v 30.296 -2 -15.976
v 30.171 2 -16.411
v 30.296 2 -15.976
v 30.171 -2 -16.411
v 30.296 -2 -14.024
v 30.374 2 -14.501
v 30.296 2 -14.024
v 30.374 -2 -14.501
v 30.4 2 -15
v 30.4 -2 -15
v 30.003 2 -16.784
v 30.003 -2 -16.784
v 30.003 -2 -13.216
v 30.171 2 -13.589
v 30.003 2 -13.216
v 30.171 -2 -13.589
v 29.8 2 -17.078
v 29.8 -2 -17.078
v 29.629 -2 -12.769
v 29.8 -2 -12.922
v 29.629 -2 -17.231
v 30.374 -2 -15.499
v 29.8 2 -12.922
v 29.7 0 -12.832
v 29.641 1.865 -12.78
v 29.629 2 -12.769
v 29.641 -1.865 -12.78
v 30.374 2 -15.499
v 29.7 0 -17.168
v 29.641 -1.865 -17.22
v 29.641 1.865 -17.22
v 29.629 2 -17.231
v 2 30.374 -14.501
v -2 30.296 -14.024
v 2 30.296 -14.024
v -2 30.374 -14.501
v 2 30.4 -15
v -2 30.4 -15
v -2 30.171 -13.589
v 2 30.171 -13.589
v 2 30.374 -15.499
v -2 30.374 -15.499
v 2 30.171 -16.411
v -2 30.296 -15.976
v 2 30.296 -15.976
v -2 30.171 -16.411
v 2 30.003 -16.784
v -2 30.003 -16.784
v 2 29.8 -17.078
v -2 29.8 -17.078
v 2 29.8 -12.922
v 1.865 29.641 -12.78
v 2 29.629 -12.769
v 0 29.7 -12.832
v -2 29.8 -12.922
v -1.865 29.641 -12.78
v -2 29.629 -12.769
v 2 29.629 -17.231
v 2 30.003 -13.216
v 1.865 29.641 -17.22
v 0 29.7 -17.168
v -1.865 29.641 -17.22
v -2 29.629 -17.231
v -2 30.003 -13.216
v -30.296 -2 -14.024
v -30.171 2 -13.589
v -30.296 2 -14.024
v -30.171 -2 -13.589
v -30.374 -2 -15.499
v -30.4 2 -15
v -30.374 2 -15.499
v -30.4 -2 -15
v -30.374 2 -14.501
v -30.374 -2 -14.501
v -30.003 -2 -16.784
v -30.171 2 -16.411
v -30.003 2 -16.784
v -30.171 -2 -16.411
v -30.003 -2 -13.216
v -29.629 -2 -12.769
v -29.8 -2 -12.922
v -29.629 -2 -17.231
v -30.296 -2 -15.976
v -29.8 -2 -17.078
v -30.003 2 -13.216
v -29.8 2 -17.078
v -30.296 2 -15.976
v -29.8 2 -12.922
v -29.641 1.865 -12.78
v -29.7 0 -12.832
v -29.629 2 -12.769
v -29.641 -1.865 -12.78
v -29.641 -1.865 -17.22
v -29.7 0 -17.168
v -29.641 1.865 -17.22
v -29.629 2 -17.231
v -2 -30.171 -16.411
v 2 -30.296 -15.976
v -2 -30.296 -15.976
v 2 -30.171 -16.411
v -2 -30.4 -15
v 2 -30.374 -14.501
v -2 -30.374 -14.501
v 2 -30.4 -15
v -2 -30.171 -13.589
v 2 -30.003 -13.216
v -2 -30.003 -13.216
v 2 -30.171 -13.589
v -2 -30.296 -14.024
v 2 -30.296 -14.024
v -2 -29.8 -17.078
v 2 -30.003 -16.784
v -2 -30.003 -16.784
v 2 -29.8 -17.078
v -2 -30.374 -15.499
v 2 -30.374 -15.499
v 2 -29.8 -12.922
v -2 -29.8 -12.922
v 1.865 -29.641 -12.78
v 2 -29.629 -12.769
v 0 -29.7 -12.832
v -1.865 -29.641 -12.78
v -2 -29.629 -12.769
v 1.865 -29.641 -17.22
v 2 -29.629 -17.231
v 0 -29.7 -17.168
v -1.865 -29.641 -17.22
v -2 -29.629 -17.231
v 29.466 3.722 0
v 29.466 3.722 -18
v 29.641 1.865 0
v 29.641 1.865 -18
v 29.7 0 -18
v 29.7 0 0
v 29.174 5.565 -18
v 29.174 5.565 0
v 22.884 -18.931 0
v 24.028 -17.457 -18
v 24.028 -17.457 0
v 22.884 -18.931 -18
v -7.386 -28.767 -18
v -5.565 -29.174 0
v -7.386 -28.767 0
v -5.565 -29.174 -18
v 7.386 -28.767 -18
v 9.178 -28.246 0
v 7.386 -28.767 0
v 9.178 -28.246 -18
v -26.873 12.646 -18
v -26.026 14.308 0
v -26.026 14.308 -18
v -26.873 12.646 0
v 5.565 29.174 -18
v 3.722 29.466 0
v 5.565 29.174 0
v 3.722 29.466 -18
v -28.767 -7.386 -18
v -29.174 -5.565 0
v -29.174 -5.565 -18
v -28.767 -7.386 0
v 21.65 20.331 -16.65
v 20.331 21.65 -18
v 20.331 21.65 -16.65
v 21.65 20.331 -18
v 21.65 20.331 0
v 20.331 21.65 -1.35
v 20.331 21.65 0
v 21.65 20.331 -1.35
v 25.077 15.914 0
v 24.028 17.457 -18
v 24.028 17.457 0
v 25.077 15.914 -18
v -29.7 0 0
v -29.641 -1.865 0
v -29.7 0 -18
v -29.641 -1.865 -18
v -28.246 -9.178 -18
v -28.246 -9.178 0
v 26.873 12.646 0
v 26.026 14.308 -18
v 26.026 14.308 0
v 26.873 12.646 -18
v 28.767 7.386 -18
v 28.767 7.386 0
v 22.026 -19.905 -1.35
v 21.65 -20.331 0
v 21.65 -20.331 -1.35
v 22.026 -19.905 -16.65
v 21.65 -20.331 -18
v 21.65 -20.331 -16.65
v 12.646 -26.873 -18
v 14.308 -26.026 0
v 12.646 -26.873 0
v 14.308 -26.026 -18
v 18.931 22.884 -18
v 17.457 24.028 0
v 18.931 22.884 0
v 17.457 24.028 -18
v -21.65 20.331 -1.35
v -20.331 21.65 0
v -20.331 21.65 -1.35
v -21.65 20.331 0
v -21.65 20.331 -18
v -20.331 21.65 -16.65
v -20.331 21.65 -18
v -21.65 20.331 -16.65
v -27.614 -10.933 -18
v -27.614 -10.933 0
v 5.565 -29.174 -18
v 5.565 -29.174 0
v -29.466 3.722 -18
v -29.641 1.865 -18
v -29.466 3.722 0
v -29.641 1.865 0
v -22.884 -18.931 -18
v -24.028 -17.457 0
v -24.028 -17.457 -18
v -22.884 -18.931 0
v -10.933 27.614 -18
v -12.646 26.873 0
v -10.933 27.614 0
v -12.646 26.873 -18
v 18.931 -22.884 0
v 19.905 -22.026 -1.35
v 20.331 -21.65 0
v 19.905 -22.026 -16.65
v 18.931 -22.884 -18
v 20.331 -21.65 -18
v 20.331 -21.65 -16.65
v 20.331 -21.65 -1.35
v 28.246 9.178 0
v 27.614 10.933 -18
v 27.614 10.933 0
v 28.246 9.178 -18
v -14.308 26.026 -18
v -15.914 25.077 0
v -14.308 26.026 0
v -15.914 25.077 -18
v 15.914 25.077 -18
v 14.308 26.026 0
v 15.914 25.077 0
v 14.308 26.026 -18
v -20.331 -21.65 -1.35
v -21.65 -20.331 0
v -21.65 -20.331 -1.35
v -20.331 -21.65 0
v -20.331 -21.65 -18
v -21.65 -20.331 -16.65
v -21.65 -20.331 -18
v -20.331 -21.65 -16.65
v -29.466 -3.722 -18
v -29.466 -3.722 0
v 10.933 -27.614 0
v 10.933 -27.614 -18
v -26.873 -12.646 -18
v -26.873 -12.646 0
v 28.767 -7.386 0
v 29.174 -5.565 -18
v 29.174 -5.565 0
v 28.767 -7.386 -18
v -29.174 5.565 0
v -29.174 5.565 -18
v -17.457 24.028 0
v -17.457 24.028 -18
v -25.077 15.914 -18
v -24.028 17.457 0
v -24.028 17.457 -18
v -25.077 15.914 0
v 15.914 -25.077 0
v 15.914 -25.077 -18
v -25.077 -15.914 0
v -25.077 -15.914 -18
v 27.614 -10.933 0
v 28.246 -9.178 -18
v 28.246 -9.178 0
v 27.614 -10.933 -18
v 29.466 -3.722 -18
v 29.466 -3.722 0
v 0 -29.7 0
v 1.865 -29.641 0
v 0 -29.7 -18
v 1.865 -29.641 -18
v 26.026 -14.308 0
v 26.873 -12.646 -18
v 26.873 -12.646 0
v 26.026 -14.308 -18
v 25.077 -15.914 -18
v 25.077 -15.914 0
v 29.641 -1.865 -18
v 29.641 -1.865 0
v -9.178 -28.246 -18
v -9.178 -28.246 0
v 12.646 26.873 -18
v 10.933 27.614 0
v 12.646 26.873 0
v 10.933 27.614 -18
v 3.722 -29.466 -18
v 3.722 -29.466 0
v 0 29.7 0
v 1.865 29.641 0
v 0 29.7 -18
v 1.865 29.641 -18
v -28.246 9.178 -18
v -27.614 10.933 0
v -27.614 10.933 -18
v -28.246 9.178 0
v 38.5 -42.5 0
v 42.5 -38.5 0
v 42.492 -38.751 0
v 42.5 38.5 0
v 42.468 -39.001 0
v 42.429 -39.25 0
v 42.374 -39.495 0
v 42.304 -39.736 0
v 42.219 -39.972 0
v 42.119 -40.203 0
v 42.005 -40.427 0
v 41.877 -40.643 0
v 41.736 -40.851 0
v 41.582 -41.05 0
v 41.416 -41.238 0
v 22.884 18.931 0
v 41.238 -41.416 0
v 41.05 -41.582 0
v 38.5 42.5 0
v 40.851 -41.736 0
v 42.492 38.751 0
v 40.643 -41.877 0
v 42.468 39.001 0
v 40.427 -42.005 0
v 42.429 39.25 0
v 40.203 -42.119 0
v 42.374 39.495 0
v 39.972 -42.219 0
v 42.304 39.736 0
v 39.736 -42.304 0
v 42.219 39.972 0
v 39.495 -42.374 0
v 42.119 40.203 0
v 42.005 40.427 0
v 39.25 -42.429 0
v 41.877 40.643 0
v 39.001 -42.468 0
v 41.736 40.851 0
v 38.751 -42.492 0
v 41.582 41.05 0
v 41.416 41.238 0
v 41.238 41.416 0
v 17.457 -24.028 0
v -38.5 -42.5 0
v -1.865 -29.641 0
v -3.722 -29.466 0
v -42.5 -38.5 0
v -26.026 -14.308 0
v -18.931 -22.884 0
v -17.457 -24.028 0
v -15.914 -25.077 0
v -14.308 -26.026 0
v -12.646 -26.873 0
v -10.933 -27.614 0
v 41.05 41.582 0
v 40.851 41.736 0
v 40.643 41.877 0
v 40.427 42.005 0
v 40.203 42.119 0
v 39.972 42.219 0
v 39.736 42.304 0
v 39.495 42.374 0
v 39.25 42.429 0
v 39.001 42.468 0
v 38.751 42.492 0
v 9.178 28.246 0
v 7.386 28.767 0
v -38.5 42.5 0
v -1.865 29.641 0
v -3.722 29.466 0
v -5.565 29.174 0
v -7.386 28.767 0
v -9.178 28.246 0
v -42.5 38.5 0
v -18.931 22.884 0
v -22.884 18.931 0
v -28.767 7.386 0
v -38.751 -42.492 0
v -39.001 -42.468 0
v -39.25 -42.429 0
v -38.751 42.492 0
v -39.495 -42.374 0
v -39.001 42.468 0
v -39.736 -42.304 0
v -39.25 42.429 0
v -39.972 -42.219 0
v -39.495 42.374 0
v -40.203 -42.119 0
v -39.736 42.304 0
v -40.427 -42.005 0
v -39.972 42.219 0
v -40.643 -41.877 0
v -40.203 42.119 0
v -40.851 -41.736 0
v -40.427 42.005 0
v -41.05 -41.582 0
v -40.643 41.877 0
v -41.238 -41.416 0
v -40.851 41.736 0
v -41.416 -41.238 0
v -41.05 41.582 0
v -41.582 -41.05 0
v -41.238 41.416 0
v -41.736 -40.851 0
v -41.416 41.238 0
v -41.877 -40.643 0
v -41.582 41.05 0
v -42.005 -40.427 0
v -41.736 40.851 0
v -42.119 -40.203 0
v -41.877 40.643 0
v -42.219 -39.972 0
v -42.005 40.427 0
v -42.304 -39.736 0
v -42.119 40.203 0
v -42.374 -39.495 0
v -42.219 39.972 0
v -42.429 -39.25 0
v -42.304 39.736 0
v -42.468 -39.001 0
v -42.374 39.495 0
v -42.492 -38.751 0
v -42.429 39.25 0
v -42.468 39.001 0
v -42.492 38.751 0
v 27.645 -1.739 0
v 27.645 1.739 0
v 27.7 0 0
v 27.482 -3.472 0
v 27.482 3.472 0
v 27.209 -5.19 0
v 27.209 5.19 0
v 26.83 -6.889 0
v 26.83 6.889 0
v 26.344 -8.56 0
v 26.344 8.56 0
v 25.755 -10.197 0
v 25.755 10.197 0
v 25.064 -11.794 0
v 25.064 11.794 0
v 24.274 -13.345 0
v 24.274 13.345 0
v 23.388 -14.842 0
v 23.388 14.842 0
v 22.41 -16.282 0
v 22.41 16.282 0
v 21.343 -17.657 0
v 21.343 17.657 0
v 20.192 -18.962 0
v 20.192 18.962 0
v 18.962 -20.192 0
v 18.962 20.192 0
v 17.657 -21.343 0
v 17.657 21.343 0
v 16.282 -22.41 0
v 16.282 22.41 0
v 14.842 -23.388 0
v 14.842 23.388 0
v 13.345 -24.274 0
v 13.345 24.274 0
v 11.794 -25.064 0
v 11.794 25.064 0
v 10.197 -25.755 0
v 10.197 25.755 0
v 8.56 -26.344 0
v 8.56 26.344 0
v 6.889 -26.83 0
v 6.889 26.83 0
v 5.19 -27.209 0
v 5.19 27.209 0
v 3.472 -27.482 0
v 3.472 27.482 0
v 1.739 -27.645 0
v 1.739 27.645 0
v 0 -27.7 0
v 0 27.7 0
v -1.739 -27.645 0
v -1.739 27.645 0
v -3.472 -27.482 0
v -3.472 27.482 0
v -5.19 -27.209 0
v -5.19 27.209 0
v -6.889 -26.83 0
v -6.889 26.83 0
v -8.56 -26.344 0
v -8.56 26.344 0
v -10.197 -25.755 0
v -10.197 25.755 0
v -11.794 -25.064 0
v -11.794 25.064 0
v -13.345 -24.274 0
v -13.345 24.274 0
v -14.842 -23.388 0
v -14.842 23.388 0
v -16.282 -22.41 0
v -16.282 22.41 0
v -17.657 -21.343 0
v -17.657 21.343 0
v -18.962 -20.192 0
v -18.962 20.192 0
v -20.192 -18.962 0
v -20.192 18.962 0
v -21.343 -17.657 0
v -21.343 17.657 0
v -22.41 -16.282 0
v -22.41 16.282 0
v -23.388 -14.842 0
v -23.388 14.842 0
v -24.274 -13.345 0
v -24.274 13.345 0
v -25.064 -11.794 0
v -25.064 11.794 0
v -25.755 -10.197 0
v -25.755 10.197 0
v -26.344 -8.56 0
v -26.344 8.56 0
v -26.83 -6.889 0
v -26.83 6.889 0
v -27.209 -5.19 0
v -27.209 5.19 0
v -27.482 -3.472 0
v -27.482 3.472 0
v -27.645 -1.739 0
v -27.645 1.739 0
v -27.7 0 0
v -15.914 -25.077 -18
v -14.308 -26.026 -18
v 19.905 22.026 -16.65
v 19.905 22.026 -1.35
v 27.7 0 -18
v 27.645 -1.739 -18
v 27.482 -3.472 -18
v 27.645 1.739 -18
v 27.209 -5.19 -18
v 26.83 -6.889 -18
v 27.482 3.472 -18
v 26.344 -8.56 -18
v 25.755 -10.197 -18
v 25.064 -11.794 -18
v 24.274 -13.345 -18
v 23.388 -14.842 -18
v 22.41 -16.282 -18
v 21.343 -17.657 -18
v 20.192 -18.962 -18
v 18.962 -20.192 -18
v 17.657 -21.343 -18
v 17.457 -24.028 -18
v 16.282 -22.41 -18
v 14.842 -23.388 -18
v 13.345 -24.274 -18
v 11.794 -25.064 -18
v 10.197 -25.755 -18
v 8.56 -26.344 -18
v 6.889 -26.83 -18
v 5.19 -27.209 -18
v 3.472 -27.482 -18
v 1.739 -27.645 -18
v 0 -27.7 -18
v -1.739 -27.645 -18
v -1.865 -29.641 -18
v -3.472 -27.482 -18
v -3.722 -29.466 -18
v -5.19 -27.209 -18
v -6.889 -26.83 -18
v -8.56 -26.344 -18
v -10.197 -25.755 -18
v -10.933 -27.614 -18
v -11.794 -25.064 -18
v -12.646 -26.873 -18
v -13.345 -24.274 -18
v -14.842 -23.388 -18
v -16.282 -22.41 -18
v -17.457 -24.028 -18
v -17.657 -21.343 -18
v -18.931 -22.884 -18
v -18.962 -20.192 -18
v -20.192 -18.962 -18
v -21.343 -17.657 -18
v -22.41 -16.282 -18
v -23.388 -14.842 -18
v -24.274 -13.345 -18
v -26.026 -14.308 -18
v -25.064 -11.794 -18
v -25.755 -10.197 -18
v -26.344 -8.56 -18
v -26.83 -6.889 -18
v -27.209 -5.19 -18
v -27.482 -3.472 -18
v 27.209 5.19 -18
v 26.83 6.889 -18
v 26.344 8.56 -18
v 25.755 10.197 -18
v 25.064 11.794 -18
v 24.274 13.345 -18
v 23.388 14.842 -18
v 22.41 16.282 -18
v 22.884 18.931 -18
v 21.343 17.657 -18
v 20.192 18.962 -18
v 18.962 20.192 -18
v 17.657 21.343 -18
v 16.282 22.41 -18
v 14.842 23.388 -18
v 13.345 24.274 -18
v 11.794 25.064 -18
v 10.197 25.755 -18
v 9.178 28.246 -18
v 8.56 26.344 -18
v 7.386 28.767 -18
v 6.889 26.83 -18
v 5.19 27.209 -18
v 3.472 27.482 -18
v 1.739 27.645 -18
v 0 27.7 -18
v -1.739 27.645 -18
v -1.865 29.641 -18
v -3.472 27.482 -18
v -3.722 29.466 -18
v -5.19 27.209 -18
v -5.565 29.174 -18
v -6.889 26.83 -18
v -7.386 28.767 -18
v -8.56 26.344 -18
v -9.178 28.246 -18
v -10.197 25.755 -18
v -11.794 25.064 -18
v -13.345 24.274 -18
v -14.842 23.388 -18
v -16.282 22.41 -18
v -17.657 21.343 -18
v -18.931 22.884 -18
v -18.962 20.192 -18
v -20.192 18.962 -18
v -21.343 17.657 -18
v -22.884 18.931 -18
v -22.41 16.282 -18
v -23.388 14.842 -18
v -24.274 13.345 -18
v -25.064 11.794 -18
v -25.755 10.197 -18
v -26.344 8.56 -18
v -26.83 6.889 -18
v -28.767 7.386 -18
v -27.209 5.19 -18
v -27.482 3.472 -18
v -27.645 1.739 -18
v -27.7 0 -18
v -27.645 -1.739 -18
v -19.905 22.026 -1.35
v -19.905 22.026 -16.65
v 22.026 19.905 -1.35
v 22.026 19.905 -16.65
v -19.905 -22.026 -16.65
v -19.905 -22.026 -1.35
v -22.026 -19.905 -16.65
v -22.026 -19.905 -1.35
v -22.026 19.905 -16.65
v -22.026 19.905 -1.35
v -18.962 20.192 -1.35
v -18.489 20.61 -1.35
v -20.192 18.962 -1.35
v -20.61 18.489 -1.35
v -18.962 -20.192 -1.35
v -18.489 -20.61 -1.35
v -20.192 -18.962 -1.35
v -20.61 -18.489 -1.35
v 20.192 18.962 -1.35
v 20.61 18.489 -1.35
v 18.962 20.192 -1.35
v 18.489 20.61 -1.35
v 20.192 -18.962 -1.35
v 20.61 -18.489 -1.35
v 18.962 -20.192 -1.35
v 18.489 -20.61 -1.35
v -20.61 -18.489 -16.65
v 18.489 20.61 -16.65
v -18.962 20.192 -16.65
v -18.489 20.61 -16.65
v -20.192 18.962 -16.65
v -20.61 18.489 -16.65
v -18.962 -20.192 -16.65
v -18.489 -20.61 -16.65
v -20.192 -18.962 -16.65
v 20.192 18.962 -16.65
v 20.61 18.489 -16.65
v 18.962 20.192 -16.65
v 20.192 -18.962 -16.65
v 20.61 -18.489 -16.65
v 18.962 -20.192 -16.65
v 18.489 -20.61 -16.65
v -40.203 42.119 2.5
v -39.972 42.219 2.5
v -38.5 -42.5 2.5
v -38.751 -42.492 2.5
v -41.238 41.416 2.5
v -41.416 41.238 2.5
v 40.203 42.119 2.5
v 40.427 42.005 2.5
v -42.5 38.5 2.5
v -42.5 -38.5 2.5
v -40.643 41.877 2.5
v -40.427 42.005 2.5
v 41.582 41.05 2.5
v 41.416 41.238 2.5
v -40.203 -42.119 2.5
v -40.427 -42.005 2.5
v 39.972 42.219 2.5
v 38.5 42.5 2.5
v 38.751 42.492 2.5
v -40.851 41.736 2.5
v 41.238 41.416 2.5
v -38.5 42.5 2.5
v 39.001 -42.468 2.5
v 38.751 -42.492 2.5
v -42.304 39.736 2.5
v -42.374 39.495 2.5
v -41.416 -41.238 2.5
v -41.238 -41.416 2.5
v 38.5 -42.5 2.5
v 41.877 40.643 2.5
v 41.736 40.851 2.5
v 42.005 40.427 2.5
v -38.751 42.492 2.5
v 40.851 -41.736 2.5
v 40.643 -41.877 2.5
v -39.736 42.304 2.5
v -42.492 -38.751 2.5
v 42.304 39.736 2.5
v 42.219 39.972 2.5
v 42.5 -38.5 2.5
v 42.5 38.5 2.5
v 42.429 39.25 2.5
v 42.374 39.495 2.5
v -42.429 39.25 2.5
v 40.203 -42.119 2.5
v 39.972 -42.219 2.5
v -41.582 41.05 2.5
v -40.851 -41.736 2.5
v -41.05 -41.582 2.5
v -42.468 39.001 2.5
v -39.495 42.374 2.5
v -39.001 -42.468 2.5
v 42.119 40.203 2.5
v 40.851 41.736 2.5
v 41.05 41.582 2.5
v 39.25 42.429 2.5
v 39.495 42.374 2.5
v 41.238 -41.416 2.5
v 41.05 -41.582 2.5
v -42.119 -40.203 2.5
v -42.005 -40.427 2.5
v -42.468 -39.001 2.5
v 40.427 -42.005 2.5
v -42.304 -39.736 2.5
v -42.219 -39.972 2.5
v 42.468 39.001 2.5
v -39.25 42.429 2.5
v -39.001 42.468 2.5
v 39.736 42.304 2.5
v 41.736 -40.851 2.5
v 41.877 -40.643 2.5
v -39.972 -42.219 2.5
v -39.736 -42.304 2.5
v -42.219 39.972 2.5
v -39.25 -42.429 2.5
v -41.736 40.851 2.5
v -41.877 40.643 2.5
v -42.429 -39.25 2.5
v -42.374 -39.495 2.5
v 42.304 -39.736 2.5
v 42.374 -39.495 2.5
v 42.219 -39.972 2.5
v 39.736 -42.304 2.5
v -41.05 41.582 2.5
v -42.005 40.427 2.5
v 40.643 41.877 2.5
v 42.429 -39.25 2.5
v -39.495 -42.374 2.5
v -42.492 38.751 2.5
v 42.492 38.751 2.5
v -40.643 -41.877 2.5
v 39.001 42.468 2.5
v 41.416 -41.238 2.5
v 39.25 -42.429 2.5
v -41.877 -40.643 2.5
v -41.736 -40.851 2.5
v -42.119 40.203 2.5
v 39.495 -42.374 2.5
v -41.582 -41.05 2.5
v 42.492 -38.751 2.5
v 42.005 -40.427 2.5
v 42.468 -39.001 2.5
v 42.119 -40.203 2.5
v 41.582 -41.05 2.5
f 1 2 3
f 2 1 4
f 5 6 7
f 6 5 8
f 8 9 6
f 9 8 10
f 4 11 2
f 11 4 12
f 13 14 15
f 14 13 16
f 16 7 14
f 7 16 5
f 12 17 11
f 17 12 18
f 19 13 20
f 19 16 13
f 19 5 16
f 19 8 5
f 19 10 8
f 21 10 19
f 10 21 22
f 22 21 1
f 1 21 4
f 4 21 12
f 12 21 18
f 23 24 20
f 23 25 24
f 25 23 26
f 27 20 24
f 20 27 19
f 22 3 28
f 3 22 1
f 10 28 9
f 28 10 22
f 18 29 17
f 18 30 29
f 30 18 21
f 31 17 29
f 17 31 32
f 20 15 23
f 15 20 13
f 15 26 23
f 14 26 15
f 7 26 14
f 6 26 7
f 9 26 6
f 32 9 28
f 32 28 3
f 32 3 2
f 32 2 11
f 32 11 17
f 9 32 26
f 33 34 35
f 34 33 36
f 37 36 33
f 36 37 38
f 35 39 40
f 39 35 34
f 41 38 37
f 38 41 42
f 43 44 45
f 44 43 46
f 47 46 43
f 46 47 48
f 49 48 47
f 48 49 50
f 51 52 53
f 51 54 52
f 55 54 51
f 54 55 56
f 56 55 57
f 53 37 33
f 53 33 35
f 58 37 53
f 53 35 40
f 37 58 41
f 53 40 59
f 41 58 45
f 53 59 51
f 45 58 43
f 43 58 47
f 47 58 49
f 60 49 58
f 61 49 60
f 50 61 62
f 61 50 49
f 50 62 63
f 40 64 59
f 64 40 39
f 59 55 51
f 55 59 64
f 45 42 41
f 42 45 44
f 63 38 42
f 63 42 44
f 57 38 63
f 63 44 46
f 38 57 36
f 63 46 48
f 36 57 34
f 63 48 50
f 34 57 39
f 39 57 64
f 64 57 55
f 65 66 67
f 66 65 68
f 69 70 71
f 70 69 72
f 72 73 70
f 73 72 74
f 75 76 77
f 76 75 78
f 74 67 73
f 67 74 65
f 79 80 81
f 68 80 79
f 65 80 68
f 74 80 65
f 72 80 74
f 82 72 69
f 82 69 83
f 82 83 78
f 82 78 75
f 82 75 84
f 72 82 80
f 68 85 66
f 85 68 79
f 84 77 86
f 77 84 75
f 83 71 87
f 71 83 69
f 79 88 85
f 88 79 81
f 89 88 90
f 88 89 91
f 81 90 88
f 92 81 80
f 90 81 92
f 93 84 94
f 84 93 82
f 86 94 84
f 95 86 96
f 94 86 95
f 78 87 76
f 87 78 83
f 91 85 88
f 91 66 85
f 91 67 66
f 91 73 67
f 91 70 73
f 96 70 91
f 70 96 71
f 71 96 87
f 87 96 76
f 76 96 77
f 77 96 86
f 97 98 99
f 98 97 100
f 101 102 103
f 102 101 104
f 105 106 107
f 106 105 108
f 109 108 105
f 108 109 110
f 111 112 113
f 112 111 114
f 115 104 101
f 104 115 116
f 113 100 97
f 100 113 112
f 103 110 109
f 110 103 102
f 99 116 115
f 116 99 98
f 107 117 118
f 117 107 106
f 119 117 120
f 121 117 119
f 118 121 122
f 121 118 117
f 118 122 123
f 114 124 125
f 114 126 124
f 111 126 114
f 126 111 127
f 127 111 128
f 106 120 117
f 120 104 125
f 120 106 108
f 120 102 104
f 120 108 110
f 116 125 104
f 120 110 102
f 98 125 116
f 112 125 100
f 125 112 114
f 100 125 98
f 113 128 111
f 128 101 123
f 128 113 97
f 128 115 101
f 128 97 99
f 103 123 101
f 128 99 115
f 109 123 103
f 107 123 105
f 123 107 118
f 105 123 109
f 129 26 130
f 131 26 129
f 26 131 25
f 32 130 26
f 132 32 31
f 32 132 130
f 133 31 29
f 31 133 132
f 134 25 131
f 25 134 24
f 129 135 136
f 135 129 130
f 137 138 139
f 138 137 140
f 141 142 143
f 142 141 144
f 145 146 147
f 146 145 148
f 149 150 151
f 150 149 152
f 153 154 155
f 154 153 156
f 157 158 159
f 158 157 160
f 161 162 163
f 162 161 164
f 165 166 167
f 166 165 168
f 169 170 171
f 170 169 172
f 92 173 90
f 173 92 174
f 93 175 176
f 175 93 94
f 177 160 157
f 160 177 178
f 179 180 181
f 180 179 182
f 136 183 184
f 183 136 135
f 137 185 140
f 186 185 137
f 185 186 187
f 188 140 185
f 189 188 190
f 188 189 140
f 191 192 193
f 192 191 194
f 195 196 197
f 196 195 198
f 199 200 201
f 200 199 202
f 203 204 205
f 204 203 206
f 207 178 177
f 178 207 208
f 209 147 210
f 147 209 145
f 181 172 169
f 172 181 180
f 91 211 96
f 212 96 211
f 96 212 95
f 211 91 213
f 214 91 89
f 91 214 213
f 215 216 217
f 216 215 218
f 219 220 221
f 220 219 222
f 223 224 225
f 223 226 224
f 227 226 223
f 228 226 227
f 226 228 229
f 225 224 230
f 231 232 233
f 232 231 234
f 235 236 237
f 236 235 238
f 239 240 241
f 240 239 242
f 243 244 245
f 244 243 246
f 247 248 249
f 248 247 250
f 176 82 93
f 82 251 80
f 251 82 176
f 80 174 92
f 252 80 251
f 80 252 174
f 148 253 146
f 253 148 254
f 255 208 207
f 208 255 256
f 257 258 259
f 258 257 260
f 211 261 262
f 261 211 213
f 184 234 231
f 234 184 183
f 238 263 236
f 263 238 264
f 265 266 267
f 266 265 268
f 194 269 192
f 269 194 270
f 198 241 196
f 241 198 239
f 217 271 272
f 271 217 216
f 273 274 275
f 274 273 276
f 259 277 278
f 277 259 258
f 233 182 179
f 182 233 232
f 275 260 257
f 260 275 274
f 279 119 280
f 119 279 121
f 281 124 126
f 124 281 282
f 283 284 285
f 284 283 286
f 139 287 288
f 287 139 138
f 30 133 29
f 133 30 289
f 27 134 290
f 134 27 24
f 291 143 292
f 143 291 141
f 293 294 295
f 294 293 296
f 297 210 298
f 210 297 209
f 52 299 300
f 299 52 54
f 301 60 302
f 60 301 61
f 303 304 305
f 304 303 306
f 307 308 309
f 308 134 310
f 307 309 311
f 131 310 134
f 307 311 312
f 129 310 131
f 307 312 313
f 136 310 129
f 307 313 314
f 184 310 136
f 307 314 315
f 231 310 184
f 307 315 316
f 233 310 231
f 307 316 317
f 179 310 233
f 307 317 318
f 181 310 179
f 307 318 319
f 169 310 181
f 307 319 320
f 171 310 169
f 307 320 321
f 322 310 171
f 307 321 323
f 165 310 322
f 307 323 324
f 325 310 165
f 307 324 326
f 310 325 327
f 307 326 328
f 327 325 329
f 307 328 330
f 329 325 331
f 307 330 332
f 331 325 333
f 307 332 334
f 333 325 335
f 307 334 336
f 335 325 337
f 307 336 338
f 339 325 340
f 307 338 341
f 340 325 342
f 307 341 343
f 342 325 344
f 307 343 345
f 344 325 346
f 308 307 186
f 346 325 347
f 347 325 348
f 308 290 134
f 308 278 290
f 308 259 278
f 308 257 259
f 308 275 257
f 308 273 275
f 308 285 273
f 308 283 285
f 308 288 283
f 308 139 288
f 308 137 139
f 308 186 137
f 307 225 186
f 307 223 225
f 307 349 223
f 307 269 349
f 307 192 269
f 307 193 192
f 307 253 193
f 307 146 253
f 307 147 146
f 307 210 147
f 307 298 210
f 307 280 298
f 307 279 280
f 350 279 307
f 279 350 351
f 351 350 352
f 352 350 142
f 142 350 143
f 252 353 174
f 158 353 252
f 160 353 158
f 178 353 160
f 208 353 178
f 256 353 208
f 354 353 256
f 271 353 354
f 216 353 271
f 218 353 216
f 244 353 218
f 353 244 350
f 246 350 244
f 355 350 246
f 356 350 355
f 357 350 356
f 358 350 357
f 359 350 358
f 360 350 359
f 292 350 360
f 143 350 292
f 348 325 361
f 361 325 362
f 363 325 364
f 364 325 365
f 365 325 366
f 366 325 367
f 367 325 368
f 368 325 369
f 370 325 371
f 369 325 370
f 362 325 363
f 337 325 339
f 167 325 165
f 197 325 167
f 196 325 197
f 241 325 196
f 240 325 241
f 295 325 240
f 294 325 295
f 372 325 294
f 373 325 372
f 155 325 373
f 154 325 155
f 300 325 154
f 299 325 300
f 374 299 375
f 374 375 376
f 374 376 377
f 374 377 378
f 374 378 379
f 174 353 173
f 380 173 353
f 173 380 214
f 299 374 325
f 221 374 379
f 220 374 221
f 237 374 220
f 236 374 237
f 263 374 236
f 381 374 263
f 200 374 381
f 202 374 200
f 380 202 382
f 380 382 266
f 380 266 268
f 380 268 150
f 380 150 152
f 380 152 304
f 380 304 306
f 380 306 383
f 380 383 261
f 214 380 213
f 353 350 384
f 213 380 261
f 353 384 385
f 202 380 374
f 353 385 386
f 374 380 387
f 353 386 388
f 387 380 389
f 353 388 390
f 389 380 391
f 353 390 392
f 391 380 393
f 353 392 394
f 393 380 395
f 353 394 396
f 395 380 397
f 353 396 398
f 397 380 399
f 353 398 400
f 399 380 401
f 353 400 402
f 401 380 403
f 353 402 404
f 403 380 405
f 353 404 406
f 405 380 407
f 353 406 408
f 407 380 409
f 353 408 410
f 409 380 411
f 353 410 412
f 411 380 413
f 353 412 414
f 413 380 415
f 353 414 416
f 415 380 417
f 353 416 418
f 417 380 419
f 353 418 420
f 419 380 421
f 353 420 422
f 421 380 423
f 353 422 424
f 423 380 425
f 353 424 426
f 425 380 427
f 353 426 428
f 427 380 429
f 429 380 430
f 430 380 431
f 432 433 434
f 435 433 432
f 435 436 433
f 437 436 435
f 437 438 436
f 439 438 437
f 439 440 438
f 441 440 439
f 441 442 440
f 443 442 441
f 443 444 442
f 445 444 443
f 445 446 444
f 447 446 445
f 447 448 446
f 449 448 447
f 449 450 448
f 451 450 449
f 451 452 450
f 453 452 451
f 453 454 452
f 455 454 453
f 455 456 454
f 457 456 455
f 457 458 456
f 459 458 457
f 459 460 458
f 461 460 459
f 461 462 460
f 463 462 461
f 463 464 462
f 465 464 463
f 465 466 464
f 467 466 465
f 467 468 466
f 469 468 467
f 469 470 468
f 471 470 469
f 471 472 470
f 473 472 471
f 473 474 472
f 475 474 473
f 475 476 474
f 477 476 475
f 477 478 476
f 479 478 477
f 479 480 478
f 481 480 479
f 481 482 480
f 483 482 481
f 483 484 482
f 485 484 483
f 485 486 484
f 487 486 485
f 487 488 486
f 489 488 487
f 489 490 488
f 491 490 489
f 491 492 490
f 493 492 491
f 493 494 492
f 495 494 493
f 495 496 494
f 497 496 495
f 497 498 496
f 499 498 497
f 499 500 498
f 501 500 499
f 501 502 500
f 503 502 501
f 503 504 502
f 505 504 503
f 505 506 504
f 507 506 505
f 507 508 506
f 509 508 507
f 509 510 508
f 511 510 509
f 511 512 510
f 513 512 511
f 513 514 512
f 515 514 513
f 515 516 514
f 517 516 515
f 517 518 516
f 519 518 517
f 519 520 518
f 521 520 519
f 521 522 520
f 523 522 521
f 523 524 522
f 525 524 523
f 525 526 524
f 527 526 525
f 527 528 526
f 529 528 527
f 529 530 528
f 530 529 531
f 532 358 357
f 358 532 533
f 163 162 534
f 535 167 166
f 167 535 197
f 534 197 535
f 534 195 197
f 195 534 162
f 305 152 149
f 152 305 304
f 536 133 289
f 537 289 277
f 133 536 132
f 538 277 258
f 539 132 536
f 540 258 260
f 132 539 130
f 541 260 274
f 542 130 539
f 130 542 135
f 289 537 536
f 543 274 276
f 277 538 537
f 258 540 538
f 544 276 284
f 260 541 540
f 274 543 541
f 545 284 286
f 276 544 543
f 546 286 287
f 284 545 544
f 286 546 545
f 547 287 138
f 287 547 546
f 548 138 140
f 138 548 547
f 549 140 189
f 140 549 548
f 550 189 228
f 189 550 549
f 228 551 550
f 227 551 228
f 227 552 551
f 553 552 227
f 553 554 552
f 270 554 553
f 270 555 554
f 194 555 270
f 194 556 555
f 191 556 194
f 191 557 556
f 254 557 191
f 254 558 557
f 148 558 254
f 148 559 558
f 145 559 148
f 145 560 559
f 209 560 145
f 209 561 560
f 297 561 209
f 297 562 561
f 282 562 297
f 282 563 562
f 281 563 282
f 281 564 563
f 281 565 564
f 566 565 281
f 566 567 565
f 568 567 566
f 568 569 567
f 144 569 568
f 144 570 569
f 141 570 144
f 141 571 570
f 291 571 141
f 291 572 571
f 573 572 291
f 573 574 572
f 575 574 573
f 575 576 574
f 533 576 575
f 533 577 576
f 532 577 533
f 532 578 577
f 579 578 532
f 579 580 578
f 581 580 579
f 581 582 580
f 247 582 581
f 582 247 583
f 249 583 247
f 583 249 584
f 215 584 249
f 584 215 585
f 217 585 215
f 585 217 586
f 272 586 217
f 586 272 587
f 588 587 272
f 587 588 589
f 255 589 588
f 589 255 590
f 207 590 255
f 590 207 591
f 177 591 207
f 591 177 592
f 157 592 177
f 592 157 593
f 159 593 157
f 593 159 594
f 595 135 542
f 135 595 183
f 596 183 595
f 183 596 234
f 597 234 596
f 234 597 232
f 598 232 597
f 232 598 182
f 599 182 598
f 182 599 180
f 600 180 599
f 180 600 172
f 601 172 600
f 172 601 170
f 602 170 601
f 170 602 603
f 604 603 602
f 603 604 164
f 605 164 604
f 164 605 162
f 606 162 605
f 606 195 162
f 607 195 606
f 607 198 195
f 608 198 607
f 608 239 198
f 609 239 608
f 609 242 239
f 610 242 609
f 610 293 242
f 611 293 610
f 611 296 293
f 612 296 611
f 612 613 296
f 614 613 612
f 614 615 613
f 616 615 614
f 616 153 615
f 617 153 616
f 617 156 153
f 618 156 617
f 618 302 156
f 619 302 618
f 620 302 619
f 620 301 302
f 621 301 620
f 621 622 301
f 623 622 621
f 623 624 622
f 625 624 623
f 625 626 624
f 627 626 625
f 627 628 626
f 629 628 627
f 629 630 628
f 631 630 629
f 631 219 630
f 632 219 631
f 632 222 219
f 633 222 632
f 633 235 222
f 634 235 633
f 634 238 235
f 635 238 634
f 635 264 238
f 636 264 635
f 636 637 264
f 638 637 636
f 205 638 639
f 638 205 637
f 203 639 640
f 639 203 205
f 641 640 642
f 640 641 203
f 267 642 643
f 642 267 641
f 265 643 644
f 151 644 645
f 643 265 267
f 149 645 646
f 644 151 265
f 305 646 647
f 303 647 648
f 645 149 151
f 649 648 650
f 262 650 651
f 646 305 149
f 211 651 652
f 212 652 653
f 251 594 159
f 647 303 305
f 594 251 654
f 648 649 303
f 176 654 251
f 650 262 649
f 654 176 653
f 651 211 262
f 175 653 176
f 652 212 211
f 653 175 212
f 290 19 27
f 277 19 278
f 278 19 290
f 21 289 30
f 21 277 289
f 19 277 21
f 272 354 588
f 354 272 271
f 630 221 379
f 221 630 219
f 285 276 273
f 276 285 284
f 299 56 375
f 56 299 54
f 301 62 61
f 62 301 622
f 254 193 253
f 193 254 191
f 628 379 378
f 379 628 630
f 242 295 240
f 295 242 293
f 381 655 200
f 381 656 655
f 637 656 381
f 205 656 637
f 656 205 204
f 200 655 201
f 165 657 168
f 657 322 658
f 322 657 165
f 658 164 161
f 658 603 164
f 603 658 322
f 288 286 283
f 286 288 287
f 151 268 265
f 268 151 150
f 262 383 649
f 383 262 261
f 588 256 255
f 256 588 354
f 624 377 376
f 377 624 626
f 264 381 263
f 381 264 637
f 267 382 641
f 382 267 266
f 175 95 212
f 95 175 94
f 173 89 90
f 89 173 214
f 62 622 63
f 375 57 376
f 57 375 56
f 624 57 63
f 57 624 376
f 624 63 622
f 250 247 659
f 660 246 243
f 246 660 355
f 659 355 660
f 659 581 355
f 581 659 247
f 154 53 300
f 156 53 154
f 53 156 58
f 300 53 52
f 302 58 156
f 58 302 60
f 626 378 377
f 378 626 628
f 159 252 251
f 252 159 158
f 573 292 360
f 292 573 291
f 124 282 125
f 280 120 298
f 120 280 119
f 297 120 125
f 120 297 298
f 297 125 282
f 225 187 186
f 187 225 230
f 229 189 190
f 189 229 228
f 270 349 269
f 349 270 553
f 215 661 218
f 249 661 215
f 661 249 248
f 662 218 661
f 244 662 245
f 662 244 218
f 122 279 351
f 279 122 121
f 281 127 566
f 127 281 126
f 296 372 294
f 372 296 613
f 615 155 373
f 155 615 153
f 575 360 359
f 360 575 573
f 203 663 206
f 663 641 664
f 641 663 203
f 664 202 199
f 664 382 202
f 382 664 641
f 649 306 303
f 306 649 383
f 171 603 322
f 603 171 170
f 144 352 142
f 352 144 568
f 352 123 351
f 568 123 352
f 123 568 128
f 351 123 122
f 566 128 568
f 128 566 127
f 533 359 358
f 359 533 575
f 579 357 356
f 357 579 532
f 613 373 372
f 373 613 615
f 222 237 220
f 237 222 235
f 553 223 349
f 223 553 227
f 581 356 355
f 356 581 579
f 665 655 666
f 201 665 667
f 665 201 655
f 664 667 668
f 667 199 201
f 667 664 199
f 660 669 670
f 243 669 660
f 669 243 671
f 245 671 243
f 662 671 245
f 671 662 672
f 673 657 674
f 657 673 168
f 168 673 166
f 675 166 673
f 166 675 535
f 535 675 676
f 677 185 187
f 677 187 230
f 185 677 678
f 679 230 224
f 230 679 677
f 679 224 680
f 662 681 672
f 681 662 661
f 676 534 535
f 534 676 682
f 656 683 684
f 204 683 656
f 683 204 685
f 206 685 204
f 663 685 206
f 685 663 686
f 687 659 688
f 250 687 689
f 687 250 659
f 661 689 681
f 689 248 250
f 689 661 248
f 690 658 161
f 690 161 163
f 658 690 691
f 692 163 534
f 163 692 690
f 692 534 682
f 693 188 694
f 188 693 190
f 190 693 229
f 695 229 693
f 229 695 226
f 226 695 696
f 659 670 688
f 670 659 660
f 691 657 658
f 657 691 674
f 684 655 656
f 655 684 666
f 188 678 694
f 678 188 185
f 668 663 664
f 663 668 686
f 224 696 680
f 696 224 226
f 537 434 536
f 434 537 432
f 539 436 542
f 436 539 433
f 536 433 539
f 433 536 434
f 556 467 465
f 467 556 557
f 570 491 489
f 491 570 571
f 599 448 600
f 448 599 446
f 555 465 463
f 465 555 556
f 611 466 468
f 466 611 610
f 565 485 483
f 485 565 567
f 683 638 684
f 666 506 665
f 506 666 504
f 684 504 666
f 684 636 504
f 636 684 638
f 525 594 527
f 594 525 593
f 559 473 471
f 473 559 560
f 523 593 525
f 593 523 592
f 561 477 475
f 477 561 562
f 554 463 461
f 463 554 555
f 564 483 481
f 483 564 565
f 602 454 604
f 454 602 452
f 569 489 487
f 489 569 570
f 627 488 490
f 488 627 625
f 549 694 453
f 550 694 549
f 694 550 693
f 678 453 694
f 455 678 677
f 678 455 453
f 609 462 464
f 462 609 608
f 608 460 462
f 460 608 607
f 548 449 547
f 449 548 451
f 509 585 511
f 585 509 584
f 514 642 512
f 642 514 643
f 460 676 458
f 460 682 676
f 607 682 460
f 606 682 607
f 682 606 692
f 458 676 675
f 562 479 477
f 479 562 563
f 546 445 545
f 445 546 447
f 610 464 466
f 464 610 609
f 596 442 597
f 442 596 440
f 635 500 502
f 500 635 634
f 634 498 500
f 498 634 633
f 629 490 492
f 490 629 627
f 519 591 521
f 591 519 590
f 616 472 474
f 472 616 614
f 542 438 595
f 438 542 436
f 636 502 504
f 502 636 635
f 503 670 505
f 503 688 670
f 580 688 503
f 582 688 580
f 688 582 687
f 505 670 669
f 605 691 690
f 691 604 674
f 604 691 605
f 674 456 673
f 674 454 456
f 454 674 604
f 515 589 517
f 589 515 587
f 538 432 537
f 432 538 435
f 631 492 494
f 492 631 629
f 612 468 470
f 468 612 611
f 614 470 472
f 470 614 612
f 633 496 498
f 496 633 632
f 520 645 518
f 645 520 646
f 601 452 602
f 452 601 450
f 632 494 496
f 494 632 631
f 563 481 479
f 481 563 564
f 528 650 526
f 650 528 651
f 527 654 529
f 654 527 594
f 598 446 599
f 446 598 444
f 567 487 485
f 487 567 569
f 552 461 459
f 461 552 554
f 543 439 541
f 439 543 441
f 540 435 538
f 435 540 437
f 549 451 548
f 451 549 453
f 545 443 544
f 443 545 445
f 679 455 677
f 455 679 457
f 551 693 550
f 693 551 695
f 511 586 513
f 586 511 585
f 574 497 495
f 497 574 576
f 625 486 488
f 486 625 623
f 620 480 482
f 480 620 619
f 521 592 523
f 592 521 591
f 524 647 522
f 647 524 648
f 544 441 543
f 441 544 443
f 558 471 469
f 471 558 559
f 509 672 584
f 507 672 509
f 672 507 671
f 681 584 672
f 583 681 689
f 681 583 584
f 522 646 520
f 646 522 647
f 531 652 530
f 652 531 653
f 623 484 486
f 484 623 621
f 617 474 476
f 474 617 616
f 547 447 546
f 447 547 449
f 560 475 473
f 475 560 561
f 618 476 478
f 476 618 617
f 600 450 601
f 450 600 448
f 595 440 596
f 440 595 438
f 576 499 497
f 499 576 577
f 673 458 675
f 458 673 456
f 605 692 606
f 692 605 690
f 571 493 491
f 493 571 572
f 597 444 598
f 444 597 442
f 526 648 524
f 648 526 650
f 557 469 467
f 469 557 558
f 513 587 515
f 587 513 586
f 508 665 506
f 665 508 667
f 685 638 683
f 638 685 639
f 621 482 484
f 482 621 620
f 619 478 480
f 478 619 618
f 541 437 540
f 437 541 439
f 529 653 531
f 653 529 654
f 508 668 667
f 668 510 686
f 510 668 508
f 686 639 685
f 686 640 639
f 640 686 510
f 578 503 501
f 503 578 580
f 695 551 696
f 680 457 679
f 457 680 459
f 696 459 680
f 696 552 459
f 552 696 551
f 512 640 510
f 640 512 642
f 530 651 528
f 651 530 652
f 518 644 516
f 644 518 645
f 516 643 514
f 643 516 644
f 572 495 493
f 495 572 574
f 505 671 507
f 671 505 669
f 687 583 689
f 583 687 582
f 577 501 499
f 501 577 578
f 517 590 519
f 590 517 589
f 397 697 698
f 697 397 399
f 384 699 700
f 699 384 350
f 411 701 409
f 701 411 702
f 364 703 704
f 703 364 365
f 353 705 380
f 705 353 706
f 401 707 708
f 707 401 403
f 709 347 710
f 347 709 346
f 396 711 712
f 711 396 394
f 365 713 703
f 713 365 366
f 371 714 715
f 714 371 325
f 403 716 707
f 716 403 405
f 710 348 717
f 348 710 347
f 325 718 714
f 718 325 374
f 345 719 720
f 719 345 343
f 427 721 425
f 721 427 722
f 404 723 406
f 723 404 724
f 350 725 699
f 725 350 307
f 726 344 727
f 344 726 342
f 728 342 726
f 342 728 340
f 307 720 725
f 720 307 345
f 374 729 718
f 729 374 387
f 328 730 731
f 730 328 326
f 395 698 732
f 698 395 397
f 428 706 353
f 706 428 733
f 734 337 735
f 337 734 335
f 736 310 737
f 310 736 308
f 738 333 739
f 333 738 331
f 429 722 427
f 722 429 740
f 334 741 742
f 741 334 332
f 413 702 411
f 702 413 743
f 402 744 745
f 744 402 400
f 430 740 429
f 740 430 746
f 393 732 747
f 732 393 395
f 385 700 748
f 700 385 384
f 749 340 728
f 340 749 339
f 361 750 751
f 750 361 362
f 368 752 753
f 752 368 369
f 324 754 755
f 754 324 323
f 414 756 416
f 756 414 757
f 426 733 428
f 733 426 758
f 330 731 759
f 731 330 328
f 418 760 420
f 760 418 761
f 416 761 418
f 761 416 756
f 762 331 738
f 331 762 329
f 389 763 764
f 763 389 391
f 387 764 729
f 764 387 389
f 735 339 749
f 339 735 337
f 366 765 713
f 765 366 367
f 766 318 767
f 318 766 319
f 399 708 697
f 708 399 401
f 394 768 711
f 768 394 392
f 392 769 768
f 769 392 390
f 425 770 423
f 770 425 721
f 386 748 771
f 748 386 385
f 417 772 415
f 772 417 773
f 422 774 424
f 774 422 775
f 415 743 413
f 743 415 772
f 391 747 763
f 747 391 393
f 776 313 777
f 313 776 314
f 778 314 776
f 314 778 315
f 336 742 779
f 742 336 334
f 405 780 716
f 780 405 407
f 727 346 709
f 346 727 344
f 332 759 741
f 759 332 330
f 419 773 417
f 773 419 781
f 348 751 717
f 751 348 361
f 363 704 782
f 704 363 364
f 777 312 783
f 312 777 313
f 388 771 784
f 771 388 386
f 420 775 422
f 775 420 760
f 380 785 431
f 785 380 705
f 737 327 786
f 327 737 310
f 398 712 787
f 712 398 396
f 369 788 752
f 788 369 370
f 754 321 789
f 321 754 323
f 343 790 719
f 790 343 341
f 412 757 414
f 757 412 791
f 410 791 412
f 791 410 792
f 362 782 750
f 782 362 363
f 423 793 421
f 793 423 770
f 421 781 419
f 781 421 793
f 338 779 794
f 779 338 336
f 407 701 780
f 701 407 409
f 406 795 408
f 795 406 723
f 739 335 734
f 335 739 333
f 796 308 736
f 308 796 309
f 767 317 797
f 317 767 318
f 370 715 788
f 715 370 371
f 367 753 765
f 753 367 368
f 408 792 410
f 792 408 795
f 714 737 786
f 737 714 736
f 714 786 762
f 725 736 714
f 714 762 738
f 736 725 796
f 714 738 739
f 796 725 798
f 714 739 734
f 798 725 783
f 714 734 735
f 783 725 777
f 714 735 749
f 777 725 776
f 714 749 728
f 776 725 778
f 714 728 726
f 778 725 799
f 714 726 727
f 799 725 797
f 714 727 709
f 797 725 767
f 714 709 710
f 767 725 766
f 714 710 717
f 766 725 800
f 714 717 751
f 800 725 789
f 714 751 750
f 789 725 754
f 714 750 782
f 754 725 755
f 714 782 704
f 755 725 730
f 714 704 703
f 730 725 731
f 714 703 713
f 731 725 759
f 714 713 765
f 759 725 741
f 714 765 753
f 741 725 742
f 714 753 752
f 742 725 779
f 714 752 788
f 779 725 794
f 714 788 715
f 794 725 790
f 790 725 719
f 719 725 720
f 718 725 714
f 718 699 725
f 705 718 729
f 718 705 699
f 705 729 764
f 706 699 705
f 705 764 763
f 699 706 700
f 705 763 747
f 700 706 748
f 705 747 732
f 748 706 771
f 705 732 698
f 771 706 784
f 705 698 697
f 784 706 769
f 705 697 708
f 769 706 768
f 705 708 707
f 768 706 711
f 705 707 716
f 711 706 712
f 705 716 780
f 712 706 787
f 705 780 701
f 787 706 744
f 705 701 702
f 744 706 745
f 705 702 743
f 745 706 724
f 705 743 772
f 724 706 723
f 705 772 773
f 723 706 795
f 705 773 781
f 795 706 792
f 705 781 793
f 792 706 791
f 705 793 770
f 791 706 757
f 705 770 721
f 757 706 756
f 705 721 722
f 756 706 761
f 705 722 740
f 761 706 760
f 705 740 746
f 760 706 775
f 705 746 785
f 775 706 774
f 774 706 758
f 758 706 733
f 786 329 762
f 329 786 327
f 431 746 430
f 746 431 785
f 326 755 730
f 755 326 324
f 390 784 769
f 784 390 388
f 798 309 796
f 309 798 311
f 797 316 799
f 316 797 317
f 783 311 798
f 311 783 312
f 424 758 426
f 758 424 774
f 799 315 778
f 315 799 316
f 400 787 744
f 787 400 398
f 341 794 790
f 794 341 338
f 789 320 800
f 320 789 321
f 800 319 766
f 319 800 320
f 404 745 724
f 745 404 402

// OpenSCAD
// ==========================================
// COPERTURA SCATOLA ELETTRICA AD INCASTRO
// ==========================================
// Design parametrico per tappo a frizione
// Basato su foro circolare da ~60mm (dalle foto utente)

// --- PARAMETRI DI BASE (In millimetri) ---

/* [Dimensioni Placca Esterna] */
// Larghezza della placca quadrata visibile sul muro
placca_width = 85; // Standard italiano spesso è 80-85mm
// Spessore della placca visibile
placca_thickness = 2.5;
// Raggio stondatura angoli placca
corner_radius = 4;

/* [Dimensioni Incastro (Il foro nel muro)] */
// Diametro stimato del foro interno (dalle foto è circa 60mm)
hole_diameter = 60;
// Profondità dell'inserimento nel muro
insert_depth = 18;
// Tolleranza per la stampa (riduce il diametro dell'inserto per farlo entrare)
// Aumenta se troppo stretto, diminuisci se troppo largo.
tolerance = 0.6; 

/* [Dettagli Incastro] */
// Spessore delle pareti del cilindro che entra nel muro
wall_thickness = 2;
// Quanto sporgono i dentini di tenuta
grip_bump_size = 0.8;

// Risoluzione curve (più alto = più liscio)
$fn = 100;

// --- CALCOLI ---
actual_insert_od = hole_diameter - tolerance;
actual_insert_id = actual_insert_od - (wall_thickness * 2);

// ==========================================
// MODULI
// ==========================================

// Modulo per la placca esterna stondata
module rounded_plate() {
    translate([0, 0, placca_thickness / 2])
    minkowski() {
        cube([placca_width - (corner_radius * 2), placca_width - (corner_radius * 2), placca_thickness / 2], center = true);
        cylinder(r = corner_radius, h = placca_thickness / 2, center = true);
    }
}

// Modulo per il meccanismo di incastro a frizione
module friction_insert() {
    difference() {
        // 1. Il cilindro principale cavo
        union() {
            // Tubo base
            translate([0, 0, -insert_depth])
            cylinder(h = insert_depth, d = actual_insert_od);
            
            // Aggiunta dei dentini di tenuta (bumps)
            // Ne mettiamo 4, uno ogni 90 gradi
            for(i = [0:90:270]) {
                rotate([0, 0, i])
                translate([actual_insert_od/2 - 0.5, 0, -insert_depth + 3])
                rotate([90,0,0])
                // Usiamo una sfera schiacciata per fare un dentino morbido
                scale([grip_bump_size*1.5, grip_bump_size*3, 1])
                cylinder(h=4, r=1, center=true, $fn=30);
            }
        }

        // 2. Taglio interno per renderlo cavo
        translate([0, 0, -insert_depth - 1])
        cylinder(h = insert_depth + 2, d = actual_insert_id);

        // 3. Tagli verticali per flessibilità (Slots)
        // Creiamo 4 fessure per permettere alle pareti di flettere
        for(r = [45:90:315]) {
            rotate([0, 0, r])
            translate([0, 0, -insert_depth/2])
            cube([actual_insert_od + 5, 3, insert_depth * 0.85], center = true);
        }
    }
}

// ==========================================
// ASSEMBLAGGIO FINALE
// ==========================================

union() {
    // Colore bianco per la placca
    color("White") rounded_plate();
    
    // Colore grigio chiaro per l'inserto (per visualizzazione)
    color("LightGrey") friction_insert();
}

// ==========================================
// NOTE PER L'UTENTE:
// Se l'oggetto non entra: aumenta il parametro 'tolerance'.
// Se l'oggetto balla: diminuisci 'tolerance' o aumenta 'grip_bump_size'.
// ==========================================
